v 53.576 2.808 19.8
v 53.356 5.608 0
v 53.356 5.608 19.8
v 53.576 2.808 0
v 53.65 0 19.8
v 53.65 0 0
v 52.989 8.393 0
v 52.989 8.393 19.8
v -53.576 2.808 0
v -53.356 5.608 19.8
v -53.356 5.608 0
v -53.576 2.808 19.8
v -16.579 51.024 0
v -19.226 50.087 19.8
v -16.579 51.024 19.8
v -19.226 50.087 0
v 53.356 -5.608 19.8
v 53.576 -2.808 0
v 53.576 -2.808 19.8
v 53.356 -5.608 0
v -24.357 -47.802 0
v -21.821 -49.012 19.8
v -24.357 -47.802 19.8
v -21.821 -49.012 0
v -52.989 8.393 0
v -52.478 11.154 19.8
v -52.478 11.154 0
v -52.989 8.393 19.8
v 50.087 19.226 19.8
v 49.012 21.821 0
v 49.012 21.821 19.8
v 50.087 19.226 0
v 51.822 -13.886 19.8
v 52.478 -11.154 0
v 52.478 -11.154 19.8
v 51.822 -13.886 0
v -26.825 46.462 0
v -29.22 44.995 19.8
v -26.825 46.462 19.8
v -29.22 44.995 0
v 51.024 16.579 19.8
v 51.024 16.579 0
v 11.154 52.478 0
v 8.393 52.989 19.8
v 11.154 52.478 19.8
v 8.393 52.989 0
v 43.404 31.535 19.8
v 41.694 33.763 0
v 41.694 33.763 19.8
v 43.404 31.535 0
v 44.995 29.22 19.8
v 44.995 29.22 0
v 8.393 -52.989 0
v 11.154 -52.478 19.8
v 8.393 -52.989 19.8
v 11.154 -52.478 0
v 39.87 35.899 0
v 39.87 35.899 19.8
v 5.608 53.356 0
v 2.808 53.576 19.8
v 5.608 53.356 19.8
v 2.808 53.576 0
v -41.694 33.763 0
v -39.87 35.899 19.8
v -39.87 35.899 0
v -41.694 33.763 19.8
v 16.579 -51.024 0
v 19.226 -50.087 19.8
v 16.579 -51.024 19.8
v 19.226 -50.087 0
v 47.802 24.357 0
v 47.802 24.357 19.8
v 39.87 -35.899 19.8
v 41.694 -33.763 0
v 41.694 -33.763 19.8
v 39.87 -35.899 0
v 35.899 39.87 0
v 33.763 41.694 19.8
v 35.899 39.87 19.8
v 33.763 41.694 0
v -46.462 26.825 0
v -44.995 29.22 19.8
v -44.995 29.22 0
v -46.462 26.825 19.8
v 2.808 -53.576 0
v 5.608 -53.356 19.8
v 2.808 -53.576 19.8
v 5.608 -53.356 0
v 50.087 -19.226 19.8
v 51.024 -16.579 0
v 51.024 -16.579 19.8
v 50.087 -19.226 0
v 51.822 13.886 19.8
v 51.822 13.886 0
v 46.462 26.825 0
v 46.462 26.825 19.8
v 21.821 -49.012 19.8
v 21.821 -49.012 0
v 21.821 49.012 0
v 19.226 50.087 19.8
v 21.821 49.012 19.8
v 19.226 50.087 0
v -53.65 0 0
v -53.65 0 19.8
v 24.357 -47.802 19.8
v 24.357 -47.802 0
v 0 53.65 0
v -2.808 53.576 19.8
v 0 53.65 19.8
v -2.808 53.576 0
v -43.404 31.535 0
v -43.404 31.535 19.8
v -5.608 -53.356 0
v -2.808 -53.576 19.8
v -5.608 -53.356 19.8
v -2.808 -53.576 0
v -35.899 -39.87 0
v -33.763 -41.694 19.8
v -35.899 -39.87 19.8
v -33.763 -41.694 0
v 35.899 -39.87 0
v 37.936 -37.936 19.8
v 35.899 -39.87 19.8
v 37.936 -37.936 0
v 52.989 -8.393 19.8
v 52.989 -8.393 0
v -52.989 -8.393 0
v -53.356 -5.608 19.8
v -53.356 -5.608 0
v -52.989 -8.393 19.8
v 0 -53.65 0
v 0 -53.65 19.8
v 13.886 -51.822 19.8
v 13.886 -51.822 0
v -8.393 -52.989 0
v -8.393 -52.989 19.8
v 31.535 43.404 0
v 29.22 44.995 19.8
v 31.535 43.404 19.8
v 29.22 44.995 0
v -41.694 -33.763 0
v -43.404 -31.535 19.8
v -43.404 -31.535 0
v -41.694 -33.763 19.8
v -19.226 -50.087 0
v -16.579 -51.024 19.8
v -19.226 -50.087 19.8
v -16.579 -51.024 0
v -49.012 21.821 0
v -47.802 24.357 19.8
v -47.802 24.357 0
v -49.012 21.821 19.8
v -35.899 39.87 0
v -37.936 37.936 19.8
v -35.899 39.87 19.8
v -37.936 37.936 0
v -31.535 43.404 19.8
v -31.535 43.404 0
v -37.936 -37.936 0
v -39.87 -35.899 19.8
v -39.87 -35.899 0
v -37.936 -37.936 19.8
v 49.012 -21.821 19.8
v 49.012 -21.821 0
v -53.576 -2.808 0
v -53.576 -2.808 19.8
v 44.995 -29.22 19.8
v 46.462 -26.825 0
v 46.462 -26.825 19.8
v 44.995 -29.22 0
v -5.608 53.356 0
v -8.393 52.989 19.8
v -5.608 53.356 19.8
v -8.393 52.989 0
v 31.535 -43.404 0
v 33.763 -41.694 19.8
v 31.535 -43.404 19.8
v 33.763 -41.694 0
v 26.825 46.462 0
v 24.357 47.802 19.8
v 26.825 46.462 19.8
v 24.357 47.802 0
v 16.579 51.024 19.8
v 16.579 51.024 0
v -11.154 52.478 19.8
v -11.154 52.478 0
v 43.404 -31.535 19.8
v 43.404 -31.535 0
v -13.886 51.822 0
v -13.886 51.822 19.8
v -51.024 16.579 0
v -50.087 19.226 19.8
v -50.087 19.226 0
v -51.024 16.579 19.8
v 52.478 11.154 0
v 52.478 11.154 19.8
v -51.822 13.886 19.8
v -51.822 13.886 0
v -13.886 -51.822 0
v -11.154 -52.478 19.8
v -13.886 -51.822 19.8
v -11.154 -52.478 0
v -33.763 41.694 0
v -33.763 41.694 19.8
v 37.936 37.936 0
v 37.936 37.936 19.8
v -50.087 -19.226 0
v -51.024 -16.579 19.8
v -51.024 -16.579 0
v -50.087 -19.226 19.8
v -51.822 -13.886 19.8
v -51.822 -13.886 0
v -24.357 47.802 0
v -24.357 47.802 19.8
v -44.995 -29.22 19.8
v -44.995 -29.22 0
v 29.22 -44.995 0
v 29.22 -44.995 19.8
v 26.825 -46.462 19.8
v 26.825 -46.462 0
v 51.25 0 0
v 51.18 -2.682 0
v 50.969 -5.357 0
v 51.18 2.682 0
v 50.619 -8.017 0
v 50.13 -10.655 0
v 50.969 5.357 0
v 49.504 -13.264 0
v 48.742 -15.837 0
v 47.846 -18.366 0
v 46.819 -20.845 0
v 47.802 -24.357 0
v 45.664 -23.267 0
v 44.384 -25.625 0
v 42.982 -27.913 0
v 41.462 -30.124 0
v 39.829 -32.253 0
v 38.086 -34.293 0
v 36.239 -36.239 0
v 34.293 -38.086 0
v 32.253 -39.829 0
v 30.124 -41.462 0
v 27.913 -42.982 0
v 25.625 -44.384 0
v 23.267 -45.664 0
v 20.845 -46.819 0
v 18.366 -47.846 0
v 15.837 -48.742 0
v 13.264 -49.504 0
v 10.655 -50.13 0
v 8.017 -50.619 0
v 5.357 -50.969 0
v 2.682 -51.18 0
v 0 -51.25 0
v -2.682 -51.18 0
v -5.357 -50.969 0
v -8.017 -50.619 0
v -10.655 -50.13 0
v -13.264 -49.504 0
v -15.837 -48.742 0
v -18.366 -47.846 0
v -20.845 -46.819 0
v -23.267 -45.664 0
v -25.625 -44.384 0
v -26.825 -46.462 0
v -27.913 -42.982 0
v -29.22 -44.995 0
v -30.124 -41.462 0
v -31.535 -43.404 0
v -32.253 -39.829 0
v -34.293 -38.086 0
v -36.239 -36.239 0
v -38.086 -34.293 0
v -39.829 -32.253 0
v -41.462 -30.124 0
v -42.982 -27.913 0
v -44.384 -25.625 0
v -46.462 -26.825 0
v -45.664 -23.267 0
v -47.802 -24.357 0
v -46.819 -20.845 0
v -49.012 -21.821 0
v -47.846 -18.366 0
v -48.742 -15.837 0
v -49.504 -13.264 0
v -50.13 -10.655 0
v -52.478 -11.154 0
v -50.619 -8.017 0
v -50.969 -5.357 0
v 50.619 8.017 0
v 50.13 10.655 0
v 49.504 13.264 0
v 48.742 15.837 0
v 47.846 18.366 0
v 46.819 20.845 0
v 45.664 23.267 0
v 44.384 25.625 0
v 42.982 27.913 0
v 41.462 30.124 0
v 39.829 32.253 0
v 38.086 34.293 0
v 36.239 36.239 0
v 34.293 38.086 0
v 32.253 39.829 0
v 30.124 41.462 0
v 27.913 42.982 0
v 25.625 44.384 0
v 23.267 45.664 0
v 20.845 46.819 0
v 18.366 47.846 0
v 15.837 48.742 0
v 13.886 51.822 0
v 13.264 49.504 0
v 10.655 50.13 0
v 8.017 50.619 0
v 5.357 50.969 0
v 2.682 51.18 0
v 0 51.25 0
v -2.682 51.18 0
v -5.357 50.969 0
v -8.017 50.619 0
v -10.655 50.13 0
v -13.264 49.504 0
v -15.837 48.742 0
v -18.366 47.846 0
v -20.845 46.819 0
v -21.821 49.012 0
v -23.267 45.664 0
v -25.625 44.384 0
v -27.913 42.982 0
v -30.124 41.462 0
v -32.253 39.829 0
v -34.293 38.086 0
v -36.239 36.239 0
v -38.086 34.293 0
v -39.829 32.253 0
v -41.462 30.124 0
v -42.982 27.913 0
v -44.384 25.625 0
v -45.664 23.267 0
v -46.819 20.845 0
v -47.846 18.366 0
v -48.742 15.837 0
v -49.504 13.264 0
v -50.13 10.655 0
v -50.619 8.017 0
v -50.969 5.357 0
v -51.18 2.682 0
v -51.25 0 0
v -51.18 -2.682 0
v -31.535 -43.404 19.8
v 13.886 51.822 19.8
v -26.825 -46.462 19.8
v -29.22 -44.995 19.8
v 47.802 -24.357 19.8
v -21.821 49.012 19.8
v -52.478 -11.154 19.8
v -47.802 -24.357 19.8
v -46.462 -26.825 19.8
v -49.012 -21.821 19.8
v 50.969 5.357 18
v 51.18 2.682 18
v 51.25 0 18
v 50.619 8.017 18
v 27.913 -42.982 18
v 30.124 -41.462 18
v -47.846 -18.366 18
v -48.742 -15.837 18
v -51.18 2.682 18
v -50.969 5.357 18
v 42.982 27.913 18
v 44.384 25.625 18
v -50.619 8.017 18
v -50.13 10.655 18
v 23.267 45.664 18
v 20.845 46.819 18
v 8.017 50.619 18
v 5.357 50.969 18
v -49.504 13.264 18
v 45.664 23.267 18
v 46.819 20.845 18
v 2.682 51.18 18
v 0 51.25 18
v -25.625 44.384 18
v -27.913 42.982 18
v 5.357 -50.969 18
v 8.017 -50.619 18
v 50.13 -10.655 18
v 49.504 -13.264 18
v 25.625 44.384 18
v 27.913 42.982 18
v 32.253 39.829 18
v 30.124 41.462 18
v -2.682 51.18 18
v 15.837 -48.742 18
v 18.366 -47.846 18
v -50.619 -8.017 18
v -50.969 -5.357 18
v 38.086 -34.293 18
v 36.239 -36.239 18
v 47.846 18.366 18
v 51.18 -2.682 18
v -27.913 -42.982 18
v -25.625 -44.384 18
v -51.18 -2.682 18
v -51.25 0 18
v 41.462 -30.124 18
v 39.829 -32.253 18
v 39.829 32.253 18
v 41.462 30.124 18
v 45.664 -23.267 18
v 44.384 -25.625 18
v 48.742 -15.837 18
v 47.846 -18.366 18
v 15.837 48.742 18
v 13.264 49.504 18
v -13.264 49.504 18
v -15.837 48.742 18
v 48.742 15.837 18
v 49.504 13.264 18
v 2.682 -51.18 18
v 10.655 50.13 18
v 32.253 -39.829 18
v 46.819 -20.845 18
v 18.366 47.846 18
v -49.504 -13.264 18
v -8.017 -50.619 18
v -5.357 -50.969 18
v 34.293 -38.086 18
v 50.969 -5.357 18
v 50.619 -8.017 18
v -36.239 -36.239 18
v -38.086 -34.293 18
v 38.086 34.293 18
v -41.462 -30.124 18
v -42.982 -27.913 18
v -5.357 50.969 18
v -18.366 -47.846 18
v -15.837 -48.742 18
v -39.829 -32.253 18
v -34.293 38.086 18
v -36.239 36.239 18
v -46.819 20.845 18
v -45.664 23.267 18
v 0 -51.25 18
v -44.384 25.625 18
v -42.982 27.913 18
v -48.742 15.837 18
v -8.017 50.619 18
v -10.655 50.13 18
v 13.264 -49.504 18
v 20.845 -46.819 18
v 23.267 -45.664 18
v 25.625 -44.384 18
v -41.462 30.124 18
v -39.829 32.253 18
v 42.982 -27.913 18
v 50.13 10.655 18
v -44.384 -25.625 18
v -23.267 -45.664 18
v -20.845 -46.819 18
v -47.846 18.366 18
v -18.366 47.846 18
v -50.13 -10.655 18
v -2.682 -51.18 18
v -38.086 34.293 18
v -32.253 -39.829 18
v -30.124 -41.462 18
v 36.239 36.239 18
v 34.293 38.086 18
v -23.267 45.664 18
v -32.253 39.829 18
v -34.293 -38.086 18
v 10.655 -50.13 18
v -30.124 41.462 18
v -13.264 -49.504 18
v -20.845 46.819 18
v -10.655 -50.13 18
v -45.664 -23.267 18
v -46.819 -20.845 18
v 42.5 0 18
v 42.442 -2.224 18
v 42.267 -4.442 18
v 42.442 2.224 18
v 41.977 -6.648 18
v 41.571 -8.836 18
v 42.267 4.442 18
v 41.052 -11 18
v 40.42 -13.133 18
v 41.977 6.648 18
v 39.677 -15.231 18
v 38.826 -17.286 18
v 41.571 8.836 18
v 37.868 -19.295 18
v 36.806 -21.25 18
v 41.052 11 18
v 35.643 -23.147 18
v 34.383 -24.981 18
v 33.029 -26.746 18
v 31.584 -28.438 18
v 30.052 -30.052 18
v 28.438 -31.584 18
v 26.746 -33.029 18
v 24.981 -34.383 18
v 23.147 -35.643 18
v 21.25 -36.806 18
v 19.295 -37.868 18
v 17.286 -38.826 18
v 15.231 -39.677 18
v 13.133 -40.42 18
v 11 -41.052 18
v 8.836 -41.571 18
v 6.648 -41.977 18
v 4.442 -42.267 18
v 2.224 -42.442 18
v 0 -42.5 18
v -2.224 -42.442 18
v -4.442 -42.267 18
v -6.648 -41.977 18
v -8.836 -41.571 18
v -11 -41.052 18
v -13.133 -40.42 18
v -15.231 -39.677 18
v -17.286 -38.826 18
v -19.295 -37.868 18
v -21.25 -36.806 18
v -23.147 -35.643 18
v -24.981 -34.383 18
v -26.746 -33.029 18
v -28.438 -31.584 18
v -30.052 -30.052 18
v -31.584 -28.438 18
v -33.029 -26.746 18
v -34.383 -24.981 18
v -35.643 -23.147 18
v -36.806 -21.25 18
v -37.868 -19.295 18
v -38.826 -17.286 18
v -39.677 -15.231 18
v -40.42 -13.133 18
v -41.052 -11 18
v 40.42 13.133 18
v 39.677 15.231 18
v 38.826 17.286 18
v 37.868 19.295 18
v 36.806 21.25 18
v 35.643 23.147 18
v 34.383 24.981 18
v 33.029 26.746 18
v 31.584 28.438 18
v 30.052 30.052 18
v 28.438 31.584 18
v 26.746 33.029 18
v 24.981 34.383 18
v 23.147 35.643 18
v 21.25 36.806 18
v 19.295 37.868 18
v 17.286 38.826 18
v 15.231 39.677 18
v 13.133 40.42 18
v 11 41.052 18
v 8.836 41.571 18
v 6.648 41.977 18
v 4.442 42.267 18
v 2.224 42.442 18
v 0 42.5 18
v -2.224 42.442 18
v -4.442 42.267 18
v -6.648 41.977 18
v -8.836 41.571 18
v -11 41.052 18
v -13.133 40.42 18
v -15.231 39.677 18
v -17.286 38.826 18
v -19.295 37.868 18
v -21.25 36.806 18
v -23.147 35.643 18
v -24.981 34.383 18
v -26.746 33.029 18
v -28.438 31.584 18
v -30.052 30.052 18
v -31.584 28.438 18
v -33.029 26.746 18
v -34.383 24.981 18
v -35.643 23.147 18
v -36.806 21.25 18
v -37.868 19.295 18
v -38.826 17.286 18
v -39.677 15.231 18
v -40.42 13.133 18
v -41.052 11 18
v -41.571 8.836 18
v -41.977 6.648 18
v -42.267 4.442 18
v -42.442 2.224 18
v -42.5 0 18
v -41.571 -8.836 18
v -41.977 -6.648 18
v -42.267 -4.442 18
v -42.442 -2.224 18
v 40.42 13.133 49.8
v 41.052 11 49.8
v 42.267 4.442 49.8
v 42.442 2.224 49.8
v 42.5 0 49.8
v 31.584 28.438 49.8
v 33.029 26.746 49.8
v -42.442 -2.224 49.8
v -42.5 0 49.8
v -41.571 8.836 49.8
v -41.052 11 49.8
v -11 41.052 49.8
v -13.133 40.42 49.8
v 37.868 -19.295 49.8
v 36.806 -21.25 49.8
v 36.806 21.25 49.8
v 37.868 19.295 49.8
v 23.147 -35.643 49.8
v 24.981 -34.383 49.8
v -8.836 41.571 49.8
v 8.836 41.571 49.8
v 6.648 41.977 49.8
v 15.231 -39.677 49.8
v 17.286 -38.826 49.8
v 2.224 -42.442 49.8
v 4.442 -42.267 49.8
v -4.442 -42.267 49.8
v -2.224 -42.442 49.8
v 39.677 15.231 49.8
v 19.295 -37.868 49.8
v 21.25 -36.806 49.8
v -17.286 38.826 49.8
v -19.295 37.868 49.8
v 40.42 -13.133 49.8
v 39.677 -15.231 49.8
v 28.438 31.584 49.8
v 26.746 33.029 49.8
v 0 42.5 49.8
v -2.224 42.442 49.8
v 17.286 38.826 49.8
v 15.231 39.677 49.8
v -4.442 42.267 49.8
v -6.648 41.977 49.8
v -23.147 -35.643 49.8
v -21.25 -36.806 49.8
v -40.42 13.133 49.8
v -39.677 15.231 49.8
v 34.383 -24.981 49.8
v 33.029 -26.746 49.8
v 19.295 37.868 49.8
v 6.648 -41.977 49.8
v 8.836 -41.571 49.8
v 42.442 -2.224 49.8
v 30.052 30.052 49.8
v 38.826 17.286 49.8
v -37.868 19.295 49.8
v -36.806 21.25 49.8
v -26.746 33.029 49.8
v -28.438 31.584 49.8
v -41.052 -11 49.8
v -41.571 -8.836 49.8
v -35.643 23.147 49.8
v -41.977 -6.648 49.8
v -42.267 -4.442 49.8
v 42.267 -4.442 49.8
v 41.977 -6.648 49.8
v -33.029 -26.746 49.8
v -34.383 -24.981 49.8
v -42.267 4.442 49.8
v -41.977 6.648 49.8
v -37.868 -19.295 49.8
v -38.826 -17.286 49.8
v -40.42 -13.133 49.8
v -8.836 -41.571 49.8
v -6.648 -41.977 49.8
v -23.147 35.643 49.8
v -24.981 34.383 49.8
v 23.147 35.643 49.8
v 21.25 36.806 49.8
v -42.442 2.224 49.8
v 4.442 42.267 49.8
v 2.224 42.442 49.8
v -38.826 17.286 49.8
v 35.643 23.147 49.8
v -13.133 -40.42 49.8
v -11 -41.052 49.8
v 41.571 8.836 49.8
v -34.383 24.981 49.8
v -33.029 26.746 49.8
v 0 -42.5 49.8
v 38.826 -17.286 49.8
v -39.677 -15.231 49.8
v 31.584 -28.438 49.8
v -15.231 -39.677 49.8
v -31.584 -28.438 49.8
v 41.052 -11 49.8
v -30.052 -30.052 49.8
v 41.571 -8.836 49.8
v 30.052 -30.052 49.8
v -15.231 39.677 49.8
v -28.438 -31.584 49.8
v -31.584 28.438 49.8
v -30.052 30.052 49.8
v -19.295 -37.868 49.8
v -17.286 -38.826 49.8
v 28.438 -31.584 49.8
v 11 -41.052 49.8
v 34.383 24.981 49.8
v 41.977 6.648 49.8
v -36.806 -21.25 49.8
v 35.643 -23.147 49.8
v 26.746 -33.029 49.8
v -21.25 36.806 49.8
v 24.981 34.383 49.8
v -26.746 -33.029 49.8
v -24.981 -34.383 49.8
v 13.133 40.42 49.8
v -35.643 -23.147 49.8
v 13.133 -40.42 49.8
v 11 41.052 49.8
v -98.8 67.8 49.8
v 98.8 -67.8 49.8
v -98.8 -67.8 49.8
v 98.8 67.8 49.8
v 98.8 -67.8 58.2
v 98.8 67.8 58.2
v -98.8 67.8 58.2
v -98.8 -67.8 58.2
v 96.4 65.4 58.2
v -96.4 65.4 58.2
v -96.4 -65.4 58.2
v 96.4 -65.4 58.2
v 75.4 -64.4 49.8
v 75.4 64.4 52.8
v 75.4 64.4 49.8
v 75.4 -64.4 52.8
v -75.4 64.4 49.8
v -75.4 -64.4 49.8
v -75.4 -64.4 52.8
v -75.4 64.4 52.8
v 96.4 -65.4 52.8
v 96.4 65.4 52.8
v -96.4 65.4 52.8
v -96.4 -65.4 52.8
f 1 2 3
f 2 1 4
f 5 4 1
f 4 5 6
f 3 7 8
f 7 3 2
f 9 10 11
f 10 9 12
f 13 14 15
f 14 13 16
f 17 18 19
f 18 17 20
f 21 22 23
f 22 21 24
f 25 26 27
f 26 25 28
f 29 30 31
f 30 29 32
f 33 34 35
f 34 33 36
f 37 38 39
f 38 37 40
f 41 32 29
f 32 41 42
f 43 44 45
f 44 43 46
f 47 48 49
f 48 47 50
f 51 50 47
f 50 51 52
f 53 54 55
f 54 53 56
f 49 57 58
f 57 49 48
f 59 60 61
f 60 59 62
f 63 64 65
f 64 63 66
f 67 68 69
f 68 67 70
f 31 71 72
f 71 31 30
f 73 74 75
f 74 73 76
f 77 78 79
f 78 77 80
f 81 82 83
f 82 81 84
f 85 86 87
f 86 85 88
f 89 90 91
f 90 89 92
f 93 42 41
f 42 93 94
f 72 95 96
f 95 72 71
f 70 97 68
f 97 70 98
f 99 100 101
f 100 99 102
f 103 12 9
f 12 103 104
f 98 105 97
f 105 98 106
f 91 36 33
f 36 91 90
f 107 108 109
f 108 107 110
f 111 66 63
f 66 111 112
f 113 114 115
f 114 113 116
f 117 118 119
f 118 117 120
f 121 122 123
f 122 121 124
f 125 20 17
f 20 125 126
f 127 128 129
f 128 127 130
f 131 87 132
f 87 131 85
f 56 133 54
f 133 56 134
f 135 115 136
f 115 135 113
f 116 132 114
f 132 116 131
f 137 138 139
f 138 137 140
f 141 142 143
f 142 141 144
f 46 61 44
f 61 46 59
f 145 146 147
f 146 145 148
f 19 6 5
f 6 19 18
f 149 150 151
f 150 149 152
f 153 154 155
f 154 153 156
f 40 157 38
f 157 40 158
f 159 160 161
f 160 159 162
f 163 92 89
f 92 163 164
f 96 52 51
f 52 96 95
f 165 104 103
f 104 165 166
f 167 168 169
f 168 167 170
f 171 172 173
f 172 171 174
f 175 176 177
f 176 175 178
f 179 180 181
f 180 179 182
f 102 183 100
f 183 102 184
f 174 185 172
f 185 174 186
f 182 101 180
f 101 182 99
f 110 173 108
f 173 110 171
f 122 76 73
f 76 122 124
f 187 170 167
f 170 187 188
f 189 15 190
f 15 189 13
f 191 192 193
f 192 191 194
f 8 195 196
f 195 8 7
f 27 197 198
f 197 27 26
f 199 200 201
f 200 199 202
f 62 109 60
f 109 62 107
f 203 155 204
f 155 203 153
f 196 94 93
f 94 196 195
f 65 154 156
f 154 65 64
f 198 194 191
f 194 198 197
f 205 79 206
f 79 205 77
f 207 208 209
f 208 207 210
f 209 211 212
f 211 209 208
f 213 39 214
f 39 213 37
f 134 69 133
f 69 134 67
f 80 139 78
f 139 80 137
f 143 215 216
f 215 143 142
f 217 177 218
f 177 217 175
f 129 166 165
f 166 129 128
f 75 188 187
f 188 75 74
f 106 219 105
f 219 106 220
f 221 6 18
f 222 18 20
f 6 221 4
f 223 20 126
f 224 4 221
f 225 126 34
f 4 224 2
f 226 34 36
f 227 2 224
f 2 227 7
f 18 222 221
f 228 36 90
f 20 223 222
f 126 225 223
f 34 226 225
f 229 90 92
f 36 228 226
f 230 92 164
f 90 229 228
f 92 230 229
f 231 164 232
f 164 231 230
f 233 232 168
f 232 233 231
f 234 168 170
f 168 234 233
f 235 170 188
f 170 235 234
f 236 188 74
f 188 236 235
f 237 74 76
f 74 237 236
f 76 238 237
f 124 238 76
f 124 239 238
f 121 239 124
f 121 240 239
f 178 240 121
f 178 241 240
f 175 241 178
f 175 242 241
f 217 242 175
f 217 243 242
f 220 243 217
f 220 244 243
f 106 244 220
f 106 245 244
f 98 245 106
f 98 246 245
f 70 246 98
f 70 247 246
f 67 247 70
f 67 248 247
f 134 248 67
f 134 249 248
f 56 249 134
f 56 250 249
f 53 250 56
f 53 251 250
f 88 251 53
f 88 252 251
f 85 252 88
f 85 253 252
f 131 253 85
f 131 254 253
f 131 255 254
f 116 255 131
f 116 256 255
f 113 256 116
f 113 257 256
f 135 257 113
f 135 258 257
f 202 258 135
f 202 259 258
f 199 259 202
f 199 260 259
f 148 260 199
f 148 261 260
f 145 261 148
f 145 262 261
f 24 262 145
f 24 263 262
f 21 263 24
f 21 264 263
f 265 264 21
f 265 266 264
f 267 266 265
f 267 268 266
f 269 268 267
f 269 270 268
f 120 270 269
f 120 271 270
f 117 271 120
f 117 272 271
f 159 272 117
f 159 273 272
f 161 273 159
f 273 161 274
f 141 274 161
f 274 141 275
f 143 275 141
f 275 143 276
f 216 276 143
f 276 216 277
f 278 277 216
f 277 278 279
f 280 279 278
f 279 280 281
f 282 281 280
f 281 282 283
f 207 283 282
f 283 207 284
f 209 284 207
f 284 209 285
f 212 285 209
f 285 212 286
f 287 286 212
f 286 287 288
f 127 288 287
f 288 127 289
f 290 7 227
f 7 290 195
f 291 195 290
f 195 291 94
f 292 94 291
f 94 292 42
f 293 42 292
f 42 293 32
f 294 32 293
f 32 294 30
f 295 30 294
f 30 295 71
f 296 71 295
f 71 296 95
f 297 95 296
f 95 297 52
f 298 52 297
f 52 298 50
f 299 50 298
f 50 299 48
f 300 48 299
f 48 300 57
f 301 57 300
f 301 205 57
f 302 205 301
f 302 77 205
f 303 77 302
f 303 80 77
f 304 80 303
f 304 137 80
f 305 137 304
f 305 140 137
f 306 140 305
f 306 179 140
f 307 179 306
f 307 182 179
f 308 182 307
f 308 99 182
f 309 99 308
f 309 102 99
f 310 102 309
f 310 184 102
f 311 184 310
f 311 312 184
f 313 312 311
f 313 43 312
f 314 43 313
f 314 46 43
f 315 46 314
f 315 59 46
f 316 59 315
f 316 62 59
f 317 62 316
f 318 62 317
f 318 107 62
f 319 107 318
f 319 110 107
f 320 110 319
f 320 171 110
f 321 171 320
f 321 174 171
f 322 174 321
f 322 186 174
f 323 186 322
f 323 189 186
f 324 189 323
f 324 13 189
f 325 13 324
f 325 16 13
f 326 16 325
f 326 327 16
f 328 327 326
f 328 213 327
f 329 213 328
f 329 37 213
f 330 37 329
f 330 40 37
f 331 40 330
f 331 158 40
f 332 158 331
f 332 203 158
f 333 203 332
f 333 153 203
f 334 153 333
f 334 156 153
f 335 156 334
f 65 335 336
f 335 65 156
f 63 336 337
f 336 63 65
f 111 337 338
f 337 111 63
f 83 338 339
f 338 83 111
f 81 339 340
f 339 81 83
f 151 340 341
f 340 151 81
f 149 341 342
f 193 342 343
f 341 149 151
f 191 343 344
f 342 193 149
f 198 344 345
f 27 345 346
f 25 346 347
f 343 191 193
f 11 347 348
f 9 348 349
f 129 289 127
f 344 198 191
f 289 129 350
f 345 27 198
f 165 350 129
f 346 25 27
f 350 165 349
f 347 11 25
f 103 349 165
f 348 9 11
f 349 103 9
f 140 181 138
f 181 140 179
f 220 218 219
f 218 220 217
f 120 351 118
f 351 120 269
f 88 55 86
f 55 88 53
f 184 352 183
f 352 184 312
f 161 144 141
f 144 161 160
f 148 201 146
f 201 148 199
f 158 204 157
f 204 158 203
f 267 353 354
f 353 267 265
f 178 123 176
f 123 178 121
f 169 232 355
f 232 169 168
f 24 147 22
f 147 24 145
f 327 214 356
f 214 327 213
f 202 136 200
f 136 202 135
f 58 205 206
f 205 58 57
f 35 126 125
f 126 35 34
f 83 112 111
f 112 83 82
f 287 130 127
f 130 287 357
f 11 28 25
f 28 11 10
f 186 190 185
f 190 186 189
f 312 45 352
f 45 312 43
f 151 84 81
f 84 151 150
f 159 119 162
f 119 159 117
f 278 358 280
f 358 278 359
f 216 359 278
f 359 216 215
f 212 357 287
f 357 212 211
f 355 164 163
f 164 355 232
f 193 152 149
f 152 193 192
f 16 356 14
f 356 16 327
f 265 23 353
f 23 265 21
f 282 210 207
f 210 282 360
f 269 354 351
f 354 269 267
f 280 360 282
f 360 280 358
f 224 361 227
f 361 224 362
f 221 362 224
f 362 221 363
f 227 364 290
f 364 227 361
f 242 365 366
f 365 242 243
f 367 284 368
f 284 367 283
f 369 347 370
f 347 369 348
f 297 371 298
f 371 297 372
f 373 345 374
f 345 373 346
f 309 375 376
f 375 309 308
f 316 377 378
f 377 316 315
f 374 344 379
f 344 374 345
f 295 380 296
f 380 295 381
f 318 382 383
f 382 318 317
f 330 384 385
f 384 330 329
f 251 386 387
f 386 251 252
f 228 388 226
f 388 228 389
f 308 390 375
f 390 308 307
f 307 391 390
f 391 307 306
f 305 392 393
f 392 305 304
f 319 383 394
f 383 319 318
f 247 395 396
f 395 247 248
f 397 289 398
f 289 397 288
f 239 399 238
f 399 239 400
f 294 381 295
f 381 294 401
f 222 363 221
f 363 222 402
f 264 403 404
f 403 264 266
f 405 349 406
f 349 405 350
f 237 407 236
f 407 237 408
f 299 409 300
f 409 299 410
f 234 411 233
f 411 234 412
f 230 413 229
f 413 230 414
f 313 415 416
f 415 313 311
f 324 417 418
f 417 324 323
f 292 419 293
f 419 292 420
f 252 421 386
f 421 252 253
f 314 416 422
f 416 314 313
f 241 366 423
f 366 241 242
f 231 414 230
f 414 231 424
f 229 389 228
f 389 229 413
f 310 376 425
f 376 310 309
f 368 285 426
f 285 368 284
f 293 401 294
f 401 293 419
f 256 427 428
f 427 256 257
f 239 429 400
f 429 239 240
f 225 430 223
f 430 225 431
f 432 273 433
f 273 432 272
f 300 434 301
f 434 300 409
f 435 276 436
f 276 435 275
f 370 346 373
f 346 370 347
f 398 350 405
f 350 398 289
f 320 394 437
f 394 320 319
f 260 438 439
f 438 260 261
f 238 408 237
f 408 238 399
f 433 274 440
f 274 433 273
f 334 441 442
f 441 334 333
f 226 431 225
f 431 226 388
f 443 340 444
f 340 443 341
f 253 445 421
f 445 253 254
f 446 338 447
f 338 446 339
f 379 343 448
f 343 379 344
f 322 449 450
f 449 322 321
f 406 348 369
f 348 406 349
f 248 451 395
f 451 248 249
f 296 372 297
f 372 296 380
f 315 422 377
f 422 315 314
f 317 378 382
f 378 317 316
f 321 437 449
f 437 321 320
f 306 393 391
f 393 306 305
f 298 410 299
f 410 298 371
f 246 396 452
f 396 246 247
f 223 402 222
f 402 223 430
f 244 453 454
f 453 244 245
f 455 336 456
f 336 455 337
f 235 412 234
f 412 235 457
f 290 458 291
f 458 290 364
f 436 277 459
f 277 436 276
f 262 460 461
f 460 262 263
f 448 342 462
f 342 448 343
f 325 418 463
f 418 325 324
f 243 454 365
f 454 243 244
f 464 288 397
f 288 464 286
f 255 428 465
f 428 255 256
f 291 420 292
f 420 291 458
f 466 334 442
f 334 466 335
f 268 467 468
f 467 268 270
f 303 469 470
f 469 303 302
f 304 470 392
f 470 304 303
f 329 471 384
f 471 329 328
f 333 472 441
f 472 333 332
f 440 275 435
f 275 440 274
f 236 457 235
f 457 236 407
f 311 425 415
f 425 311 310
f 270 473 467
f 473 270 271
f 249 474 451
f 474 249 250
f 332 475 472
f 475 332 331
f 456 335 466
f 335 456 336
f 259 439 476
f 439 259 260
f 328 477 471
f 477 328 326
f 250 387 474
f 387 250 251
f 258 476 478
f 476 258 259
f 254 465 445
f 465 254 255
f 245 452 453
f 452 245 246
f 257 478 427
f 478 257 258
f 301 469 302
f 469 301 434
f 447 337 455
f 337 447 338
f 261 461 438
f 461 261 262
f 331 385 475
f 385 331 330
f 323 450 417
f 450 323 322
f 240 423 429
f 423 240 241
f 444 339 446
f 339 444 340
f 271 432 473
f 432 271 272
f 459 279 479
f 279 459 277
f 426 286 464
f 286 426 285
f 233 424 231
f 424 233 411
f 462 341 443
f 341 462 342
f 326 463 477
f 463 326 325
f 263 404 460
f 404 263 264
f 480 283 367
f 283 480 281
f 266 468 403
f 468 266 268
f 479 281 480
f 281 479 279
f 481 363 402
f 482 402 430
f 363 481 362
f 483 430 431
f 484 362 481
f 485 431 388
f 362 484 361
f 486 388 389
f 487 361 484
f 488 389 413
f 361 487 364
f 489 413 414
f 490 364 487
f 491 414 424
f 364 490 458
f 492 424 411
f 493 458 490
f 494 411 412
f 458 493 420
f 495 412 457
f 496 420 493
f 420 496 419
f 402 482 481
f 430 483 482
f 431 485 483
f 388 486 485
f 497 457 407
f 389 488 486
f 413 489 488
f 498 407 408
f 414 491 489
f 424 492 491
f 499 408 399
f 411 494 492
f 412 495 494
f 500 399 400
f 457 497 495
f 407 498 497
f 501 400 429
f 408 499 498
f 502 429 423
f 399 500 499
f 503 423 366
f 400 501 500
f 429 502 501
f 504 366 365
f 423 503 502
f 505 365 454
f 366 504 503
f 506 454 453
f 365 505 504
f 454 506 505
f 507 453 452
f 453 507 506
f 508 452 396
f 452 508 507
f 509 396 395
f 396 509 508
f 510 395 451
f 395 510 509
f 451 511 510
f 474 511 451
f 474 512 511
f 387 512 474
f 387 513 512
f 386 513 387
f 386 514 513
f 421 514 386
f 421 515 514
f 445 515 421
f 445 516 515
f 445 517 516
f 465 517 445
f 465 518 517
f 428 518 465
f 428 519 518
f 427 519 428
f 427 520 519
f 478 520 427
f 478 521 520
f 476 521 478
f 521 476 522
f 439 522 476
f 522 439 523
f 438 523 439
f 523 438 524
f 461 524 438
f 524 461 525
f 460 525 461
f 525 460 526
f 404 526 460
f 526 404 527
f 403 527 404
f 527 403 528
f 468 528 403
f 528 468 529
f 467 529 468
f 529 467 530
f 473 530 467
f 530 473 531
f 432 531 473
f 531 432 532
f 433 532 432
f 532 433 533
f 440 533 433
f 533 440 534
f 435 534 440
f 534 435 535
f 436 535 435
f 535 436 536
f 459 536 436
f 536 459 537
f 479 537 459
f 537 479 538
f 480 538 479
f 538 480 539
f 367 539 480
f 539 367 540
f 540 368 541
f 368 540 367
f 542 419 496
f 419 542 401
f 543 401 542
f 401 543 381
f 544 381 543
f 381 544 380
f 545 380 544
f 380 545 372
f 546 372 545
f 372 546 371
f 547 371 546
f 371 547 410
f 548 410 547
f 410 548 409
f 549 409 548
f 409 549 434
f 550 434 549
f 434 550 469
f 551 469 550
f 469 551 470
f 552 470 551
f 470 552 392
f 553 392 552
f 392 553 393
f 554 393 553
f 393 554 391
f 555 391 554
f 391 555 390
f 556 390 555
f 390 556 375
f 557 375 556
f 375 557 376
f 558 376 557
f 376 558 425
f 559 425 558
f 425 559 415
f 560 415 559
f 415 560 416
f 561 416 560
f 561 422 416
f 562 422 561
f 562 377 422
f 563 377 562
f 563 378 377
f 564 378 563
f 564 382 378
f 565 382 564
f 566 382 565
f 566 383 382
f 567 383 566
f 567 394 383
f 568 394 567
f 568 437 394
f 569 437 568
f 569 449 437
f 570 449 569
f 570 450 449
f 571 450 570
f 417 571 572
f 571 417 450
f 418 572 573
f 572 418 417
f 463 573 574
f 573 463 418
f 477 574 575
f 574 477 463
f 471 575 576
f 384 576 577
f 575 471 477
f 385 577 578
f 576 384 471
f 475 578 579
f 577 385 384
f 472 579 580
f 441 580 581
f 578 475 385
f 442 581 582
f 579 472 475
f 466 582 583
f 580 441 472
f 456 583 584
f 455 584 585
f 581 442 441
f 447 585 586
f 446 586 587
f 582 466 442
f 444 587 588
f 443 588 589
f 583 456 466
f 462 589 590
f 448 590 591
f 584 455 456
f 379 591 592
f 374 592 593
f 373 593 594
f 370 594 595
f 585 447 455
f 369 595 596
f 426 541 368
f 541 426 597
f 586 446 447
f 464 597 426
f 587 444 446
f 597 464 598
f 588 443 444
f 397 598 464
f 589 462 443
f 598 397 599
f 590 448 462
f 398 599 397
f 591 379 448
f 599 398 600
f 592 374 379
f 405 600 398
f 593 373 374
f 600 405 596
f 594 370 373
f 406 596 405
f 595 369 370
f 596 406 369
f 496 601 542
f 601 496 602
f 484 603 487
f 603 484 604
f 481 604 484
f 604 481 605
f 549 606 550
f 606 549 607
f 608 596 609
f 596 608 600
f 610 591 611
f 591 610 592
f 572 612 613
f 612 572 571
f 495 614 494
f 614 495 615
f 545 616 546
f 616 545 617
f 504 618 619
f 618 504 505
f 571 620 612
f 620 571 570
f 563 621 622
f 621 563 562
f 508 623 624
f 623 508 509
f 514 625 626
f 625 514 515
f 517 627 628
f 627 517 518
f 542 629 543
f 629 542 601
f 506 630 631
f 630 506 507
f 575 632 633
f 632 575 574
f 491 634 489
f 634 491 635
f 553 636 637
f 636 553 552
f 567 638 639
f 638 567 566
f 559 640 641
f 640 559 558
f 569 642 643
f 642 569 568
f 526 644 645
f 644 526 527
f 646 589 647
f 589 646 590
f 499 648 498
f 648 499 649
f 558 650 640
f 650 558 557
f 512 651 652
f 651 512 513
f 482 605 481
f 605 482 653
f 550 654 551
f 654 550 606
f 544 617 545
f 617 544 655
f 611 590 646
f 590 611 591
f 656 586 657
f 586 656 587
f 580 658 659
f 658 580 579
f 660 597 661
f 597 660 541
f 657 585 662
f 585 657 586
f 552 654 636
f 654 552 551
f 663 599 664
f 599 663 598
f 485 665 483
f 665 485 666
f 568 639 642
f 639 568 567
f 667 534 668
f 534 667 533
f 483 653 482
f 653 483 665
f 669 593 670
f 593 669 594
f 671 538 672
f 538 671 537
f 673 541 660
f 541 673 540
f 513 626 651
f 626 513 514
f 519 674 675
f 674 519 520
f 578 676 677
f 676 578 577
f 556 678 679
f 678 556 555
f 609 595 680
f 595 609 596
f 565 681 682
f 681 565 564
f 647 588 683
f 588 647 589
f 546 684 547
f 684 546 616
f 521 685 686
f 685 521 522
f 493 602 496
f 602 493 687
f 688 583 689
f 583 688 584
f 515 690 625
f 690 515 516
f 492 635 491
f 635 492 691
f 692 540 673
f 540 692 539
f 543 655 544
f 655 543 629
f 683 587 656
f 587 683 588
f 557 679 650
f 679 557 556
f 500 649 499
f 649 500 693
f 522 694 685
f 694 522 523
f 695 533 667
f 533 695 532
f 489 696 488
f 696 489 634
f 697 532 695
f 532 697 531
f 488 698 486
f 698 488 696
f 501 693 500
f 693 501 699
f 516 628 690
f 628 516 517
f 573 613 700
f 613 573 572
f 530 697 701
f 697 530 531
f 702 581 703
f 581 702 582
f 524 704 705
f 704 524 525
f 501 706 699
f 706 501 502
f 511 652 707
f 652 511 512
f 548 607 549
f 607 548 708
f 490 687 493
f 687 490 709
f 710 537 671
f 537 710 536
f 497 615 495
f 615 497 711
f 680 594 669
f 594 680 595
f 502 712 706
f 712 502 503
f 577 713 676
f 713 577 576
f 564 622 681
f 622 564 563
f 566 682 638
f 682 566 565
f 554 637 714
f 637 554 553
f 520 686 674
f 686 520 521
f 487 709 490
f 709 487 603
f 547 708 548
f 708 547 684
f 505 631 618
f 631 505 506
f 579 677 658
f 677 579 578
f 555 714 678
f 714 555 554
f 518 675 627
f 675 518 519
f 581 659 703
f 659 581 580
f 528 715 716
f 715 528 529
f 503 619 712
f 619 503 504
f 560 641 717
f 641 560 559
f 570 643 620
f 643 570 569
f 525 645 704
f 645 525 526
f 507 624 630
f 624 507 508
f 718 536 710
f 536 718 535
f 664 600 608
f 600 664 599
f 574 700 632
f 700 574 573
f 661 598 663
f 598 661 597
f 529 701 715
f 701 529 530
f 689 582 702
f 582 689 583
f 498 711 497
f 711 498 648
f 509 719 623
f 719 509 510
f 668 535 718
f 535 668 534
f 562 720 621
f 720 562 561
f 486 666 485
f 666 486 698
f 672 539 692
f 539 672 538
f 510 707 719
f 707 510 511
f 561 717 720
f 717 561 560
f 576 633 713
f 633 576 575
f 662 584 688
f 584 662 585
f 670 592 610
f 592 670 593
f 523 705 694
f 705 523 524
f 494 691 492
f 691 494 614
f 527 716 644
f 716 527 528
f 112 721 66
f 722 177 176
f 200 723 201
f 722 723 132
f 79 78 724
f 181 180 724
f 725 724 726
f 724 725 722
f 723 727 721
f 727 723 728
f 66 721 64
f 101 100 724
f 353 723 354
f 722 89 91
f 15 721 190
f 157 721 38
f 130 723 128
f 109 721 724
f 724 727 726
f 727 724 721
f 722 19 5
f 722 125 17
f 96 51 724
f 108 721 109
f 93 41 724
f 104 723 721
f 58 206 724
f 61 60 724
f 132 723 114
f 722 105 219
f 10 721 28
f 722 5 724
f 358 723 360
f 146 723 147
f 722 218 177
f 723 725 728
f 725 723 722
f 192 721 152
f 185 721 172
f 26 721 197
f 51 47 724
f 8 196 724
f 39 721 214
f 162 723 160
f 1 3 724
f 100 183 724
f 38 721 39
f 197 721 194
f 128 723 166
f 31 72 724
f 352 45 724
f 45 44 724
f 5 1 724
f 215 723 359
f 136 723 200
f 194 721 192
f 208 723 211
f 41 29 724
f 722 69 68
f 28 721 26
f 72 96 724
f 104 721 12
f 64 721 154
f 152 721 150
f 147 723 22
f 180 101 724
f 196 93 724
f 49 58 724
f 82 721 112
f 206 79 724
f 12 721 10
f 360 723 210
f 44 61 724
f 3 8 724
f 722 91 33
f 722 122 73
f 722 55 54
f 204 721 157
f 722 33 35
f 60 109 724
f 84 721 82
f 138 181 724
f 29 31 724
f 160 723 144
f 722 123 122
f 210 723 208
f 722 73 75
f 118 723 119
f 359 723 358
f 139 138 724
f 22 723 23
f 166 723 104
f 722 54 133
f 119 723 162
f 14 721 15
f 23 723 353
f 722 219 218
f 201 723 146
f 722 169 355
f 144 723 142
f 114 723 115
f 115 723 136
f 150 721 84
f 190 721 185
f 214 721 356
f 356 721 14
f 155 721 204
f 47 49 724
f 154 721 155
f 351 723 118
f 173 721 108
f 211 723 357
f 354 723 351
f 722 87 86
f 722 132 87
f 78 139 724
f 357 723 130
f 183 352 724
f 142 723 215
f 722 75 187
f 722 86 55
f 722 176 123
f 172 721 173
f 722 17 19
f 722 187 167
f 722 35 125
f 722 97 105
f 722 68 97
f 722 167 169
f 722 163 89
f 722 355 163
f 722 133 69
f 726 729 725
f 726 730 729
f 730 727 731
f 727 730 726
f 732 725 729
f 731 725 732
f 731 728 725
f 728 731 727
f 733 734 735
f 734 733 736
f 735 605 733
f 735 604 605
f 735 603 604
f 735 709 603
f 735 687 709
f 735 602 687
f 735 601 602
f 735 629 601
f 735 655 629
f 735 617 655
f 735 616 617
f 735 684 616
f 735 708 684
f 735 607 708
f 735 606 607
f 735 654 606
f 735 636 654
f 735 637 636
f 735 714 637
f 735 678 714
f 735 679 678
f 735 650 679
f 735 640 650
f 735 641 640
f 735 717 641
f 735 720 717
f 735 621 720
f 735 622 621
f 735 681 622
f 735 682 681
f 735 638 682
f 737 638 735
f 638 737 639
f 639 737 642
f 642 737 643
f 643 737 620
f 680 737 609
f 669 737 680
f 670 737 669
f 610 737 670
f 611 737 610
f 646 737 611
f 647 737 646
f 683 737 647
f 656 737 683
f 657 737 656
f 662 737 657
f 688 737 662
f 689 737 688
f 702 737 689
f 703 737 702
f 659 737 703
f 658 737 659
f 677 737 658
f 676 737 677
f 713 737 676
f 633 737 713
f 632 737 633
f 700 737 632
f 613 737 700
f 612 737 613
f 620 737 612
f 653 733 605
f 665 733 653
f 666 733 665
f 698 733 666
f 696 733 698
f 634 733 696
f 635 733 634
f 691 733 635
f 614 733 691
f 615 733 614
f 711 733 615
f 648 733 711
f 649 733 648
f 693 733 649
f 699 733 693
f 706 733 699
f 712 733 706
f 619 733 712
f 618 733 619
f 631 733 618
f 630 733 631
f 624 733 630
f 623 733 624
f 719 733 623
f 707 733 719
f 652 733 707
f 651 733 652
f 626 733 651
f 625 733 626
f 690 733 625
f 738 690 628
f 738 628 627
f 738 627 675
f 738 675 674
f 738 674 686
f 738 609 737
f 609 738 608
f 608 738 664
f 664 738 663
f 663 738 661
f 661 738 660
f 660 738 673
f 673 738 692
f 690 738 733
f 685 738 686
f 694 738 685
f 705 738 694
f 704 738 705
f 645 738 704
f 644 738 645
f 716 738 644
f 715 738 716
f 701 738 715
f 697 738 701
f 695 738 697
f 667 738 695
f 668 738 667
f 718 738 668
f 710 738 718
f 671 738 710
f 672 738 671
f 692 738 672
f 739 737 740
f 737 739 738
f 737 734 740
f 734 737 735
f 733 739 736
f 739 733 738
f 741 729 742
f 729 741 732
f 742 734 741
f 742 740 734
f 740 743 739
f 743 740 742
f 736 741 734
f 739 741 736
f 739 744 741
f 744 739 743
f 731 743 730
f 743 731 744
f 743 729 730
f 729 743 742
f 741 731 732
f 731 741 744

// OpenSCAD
// =====================================================================
// APERTURA 75Q FLAT-FIELD CAPSTONE JIG
// =====================================================================
// Minimal-height jig that sits on the dew shield.
// Stack (bottom->top): Coupler -> PTFE diffuser -> Viltrox L116T
//
// PTFE: Trim sheet to 150 x 128 mm (one straight cut).
// The Viltrox fully covers the PTFE, blocking ambient light leakage.
// =====================================================================

// --- MODE SELECTOR ---
generate_fit_test = false;  // true = 15mm coupler test ring only
show_ghosts        = true;  // true = show non-printing PTFE/Viltrox bodies

// --- 1. SCOPE INTERFACE ---
dew_shield_od   = 102.5;   // mm, measured OD of Apertura 75Q dew shield
bore_clearance  = 0.00;    // mm, diametral clearance for coupler bore (set 0 for exact 102.5 ID)
coupler_h       = 20.0;    // mm, grip depth on dew shield
internal_stop_id = 85.0;   // mm, hard-stop inner bore (prevents over-insertion)

// --- 2. PTFE DIFFUSER (trimmed to match Viltrox short axis) ---
ptfe_w          = 150.0;   // mm, long axis (aligned with Viltrox 192mm side)
ptfe_d          = 128.0;   // mm, short axis (trimmed flush with Viltrox edge dim)
ptfe_h          = 3.0;     // mm, thickness (~1/8")

// --- 3. VILTROX L116T ---
viltrox_w       = 192.0;   // mm, net body width
viltrox_d       = 130.0;   // mm, net body depth (130 clears 129.38mm center bulge)
viltrox_h       = 30.0;    // mm, net body height (ghost only)
viltrox_lip     = 5.0;     // mm, retaining wall height around Viltrox

// --- 4. PRINT / FIT ---
wall            = 2.4;     // mm, structural wall thickness
clearance       = 0.40;    // mm, per-side clearance for rectangular pockets
eps             = 0.20;    // mm, boolean overlap to prevent coplanar artifacts

// --- DERIVED ---
inner_d         = dew_shield_od + bore_clearance;
outer_d         = inner_d + 2*wall;

// PTFE pocket (with clearance)
ptfe_pw         = ptfe_w + 2*clearance;
ptfe_pd         = ptfe_d + 2*clearance;

// Viltrox pocket (with clearance)
vilt_pw         = viltrox_w + 2*clearance;
vilt_pd         = viltrox_d + 2*clearance;

// Tray footprint: driven by the larger of PTFE or Viltrox + walls
tray_w          = max(ptfe_pw, vilt_pw) + 2*wall;
tray_d          = max(ptfe_pd, vilt_pd) + 2*wall;

// Transition hull height: must be self-supporting (~60 deg from horizontal).
// Worst-case lateral overhang = (tray diagonal/2 - outer_d/2).
// At 60 deg: h = overhang * tan(30) ~ 0.577 * overhang.
// Side overhang: (tray_w - outer_d)/2 = ~45mm -> needs ~26mm.
// Corner overhang: ~65mm -> needs ~38mm, but corners have adjacent
// material support, so 30mm is a practical safe value.
transition_h    = 30.0;    // mm, self-supporting cone/hull height

// Z-heights (built bottom-up)
z_transition    = coupler_h;                      // top of coupler / start of hull
z_tray_floor    = z_transition + transition_h;    // bottom of tray solid
z_ptfe_floor    = z_tray_floor;                   // PTFE recess bottom
z_ptfe_top      = z_ptfe_floor + ptfe_h;          // PTFE top = flush with tray bed
z_viltrox_floor = z_ptfe_top;                     // Viltrox rests here
z_lip_top       = z_viltrox_floor + viltrox_lip;  // top of retaining wall
tray_total_h    = (z_lip_top - z_tray_floor) + eps;
total_h         = z_lip_top;

$fn = 120;

// =====================================================================
module main() {
    if (generate_fit_test)
        fit_test_ring();
    else
        capstone();
}

// =====================================================================
//  CAPSTONE JIG
// =====================================================================
module capstone() {
    difference() {
        union() {
            // --- A) Coupler sleeve ---
            difference() {
                cylinder(h = coupler_h, d = outer_d);
                translate([0, 0, -1])
                    cylinder(h = coupler_h + 2, d = inner_d);
            }

            // --- B) Hard-stop ledge (2mm ring at top of coupler bore) ---
            //     Prevents jig from sliding too far down the dew shield.
            translate([0, 0, coupler_h - 2])
                difference() {
                    cylinder(h = 2, d = inner_d);
                    translate([0, 0, -1])
                        cylinder(h = 4, d = internal_stop_id);
                }

            // --- C) Self-supporting transition hull ---
            //     Lofts from coupler ring up to the rectangular tray base.
            //     30mm height keeps overhang angles printable without supports.
            translate([0, 0, z_transition - eps])
                hull() {
                    cylinder(h = eps, d = outer_d);
                    translate([-tray_w/2, -tray_d/2, transition_h])
                        cube([tray_w, tray_d, eps]);
                }

            // --- D) Solid tray block ---
            translate([-tray_w/2, -tray_d/2, z_tray_floor])
                cube([tray_w, tray_d, tray_total_h]);
        }

        // --- Subtract: PTFE recess (3mm deep, flush with tray bed) ---
        // The 1mm difference between ptfe_pd (128.8) and vilt_pd (130.8)
        // creates a ~1mm solid ledge on each side of the depth axis.
        // The Viltrox rests partly on this ledge, partly on the PTFE.
        translate([-ptfe_pw/2, -ptfe_pd/2, z_ptfe_floor - eps])
            cube([ptfe_pw, ptfe_pd, ptfe_h + eps]);

        // --- Subtract: Viltrox pocket (5mm deep, sits on tray bed) ---
        translate([-vilt_pw/2, -vilt_pd/2, z_viltrox_floor - eps])
            cube([vilt_pw, vilt_pd, viltrox_lip + 2*eps]);

        // --- Subtract: Central light aperture (85mm, full depth) ---
        translate([0, 0, -1])
            cylinder(h = total_h + 10, d = internal_stop_id);
    }

    // --- Ghost geometry (non-printing) ---
    if (show_ghosts) ghost_stack();
}

// =====================================================================
//  GHOST STACK -- Non-printing reference bodies
// =====================================================================
module ghost_stack() {
    vl = 0.05; // viz lift to avoid z-fighting

    // PTFE (white, translucent)
    %color([0.92, 0.92, 0.96, 0.55])
        translate([-ptfe_w/2, -ptfe_d/2, z_ptfe_floor + vl])
            cube([ptfe_w, ptfe_d, ptfe_h]);

    // Viltrox body (blue, translucent)
    %color([0.15, 0.5, 0.95, 0.30])
        translate([-viltrox_w/2, -viltrox_d/2, z_viltrox_floor + vl])
            cube([viltrox_w, viltrox_d, viltrox_h]);
}

// =====================================================================
//  FIT TEST RING -- quick print to verify dew-shield interface
// =====================================================================
module fit_test_ring() {
    stop_ring_h = 2.0;
    bore_h      = 15.0;
    difference() {
        cylinder(h = bore_h + stop_ring_h, d = outer_d);
        translate([0, 0, -1])
            cylinder(h = bore_h + 2, d = inner_d);
        translate([0, 0, bore_h])
            cylinder(h = stop_ring_h + 1, d = internal_stop_id);
    }
}

// =====================================================================
main();
